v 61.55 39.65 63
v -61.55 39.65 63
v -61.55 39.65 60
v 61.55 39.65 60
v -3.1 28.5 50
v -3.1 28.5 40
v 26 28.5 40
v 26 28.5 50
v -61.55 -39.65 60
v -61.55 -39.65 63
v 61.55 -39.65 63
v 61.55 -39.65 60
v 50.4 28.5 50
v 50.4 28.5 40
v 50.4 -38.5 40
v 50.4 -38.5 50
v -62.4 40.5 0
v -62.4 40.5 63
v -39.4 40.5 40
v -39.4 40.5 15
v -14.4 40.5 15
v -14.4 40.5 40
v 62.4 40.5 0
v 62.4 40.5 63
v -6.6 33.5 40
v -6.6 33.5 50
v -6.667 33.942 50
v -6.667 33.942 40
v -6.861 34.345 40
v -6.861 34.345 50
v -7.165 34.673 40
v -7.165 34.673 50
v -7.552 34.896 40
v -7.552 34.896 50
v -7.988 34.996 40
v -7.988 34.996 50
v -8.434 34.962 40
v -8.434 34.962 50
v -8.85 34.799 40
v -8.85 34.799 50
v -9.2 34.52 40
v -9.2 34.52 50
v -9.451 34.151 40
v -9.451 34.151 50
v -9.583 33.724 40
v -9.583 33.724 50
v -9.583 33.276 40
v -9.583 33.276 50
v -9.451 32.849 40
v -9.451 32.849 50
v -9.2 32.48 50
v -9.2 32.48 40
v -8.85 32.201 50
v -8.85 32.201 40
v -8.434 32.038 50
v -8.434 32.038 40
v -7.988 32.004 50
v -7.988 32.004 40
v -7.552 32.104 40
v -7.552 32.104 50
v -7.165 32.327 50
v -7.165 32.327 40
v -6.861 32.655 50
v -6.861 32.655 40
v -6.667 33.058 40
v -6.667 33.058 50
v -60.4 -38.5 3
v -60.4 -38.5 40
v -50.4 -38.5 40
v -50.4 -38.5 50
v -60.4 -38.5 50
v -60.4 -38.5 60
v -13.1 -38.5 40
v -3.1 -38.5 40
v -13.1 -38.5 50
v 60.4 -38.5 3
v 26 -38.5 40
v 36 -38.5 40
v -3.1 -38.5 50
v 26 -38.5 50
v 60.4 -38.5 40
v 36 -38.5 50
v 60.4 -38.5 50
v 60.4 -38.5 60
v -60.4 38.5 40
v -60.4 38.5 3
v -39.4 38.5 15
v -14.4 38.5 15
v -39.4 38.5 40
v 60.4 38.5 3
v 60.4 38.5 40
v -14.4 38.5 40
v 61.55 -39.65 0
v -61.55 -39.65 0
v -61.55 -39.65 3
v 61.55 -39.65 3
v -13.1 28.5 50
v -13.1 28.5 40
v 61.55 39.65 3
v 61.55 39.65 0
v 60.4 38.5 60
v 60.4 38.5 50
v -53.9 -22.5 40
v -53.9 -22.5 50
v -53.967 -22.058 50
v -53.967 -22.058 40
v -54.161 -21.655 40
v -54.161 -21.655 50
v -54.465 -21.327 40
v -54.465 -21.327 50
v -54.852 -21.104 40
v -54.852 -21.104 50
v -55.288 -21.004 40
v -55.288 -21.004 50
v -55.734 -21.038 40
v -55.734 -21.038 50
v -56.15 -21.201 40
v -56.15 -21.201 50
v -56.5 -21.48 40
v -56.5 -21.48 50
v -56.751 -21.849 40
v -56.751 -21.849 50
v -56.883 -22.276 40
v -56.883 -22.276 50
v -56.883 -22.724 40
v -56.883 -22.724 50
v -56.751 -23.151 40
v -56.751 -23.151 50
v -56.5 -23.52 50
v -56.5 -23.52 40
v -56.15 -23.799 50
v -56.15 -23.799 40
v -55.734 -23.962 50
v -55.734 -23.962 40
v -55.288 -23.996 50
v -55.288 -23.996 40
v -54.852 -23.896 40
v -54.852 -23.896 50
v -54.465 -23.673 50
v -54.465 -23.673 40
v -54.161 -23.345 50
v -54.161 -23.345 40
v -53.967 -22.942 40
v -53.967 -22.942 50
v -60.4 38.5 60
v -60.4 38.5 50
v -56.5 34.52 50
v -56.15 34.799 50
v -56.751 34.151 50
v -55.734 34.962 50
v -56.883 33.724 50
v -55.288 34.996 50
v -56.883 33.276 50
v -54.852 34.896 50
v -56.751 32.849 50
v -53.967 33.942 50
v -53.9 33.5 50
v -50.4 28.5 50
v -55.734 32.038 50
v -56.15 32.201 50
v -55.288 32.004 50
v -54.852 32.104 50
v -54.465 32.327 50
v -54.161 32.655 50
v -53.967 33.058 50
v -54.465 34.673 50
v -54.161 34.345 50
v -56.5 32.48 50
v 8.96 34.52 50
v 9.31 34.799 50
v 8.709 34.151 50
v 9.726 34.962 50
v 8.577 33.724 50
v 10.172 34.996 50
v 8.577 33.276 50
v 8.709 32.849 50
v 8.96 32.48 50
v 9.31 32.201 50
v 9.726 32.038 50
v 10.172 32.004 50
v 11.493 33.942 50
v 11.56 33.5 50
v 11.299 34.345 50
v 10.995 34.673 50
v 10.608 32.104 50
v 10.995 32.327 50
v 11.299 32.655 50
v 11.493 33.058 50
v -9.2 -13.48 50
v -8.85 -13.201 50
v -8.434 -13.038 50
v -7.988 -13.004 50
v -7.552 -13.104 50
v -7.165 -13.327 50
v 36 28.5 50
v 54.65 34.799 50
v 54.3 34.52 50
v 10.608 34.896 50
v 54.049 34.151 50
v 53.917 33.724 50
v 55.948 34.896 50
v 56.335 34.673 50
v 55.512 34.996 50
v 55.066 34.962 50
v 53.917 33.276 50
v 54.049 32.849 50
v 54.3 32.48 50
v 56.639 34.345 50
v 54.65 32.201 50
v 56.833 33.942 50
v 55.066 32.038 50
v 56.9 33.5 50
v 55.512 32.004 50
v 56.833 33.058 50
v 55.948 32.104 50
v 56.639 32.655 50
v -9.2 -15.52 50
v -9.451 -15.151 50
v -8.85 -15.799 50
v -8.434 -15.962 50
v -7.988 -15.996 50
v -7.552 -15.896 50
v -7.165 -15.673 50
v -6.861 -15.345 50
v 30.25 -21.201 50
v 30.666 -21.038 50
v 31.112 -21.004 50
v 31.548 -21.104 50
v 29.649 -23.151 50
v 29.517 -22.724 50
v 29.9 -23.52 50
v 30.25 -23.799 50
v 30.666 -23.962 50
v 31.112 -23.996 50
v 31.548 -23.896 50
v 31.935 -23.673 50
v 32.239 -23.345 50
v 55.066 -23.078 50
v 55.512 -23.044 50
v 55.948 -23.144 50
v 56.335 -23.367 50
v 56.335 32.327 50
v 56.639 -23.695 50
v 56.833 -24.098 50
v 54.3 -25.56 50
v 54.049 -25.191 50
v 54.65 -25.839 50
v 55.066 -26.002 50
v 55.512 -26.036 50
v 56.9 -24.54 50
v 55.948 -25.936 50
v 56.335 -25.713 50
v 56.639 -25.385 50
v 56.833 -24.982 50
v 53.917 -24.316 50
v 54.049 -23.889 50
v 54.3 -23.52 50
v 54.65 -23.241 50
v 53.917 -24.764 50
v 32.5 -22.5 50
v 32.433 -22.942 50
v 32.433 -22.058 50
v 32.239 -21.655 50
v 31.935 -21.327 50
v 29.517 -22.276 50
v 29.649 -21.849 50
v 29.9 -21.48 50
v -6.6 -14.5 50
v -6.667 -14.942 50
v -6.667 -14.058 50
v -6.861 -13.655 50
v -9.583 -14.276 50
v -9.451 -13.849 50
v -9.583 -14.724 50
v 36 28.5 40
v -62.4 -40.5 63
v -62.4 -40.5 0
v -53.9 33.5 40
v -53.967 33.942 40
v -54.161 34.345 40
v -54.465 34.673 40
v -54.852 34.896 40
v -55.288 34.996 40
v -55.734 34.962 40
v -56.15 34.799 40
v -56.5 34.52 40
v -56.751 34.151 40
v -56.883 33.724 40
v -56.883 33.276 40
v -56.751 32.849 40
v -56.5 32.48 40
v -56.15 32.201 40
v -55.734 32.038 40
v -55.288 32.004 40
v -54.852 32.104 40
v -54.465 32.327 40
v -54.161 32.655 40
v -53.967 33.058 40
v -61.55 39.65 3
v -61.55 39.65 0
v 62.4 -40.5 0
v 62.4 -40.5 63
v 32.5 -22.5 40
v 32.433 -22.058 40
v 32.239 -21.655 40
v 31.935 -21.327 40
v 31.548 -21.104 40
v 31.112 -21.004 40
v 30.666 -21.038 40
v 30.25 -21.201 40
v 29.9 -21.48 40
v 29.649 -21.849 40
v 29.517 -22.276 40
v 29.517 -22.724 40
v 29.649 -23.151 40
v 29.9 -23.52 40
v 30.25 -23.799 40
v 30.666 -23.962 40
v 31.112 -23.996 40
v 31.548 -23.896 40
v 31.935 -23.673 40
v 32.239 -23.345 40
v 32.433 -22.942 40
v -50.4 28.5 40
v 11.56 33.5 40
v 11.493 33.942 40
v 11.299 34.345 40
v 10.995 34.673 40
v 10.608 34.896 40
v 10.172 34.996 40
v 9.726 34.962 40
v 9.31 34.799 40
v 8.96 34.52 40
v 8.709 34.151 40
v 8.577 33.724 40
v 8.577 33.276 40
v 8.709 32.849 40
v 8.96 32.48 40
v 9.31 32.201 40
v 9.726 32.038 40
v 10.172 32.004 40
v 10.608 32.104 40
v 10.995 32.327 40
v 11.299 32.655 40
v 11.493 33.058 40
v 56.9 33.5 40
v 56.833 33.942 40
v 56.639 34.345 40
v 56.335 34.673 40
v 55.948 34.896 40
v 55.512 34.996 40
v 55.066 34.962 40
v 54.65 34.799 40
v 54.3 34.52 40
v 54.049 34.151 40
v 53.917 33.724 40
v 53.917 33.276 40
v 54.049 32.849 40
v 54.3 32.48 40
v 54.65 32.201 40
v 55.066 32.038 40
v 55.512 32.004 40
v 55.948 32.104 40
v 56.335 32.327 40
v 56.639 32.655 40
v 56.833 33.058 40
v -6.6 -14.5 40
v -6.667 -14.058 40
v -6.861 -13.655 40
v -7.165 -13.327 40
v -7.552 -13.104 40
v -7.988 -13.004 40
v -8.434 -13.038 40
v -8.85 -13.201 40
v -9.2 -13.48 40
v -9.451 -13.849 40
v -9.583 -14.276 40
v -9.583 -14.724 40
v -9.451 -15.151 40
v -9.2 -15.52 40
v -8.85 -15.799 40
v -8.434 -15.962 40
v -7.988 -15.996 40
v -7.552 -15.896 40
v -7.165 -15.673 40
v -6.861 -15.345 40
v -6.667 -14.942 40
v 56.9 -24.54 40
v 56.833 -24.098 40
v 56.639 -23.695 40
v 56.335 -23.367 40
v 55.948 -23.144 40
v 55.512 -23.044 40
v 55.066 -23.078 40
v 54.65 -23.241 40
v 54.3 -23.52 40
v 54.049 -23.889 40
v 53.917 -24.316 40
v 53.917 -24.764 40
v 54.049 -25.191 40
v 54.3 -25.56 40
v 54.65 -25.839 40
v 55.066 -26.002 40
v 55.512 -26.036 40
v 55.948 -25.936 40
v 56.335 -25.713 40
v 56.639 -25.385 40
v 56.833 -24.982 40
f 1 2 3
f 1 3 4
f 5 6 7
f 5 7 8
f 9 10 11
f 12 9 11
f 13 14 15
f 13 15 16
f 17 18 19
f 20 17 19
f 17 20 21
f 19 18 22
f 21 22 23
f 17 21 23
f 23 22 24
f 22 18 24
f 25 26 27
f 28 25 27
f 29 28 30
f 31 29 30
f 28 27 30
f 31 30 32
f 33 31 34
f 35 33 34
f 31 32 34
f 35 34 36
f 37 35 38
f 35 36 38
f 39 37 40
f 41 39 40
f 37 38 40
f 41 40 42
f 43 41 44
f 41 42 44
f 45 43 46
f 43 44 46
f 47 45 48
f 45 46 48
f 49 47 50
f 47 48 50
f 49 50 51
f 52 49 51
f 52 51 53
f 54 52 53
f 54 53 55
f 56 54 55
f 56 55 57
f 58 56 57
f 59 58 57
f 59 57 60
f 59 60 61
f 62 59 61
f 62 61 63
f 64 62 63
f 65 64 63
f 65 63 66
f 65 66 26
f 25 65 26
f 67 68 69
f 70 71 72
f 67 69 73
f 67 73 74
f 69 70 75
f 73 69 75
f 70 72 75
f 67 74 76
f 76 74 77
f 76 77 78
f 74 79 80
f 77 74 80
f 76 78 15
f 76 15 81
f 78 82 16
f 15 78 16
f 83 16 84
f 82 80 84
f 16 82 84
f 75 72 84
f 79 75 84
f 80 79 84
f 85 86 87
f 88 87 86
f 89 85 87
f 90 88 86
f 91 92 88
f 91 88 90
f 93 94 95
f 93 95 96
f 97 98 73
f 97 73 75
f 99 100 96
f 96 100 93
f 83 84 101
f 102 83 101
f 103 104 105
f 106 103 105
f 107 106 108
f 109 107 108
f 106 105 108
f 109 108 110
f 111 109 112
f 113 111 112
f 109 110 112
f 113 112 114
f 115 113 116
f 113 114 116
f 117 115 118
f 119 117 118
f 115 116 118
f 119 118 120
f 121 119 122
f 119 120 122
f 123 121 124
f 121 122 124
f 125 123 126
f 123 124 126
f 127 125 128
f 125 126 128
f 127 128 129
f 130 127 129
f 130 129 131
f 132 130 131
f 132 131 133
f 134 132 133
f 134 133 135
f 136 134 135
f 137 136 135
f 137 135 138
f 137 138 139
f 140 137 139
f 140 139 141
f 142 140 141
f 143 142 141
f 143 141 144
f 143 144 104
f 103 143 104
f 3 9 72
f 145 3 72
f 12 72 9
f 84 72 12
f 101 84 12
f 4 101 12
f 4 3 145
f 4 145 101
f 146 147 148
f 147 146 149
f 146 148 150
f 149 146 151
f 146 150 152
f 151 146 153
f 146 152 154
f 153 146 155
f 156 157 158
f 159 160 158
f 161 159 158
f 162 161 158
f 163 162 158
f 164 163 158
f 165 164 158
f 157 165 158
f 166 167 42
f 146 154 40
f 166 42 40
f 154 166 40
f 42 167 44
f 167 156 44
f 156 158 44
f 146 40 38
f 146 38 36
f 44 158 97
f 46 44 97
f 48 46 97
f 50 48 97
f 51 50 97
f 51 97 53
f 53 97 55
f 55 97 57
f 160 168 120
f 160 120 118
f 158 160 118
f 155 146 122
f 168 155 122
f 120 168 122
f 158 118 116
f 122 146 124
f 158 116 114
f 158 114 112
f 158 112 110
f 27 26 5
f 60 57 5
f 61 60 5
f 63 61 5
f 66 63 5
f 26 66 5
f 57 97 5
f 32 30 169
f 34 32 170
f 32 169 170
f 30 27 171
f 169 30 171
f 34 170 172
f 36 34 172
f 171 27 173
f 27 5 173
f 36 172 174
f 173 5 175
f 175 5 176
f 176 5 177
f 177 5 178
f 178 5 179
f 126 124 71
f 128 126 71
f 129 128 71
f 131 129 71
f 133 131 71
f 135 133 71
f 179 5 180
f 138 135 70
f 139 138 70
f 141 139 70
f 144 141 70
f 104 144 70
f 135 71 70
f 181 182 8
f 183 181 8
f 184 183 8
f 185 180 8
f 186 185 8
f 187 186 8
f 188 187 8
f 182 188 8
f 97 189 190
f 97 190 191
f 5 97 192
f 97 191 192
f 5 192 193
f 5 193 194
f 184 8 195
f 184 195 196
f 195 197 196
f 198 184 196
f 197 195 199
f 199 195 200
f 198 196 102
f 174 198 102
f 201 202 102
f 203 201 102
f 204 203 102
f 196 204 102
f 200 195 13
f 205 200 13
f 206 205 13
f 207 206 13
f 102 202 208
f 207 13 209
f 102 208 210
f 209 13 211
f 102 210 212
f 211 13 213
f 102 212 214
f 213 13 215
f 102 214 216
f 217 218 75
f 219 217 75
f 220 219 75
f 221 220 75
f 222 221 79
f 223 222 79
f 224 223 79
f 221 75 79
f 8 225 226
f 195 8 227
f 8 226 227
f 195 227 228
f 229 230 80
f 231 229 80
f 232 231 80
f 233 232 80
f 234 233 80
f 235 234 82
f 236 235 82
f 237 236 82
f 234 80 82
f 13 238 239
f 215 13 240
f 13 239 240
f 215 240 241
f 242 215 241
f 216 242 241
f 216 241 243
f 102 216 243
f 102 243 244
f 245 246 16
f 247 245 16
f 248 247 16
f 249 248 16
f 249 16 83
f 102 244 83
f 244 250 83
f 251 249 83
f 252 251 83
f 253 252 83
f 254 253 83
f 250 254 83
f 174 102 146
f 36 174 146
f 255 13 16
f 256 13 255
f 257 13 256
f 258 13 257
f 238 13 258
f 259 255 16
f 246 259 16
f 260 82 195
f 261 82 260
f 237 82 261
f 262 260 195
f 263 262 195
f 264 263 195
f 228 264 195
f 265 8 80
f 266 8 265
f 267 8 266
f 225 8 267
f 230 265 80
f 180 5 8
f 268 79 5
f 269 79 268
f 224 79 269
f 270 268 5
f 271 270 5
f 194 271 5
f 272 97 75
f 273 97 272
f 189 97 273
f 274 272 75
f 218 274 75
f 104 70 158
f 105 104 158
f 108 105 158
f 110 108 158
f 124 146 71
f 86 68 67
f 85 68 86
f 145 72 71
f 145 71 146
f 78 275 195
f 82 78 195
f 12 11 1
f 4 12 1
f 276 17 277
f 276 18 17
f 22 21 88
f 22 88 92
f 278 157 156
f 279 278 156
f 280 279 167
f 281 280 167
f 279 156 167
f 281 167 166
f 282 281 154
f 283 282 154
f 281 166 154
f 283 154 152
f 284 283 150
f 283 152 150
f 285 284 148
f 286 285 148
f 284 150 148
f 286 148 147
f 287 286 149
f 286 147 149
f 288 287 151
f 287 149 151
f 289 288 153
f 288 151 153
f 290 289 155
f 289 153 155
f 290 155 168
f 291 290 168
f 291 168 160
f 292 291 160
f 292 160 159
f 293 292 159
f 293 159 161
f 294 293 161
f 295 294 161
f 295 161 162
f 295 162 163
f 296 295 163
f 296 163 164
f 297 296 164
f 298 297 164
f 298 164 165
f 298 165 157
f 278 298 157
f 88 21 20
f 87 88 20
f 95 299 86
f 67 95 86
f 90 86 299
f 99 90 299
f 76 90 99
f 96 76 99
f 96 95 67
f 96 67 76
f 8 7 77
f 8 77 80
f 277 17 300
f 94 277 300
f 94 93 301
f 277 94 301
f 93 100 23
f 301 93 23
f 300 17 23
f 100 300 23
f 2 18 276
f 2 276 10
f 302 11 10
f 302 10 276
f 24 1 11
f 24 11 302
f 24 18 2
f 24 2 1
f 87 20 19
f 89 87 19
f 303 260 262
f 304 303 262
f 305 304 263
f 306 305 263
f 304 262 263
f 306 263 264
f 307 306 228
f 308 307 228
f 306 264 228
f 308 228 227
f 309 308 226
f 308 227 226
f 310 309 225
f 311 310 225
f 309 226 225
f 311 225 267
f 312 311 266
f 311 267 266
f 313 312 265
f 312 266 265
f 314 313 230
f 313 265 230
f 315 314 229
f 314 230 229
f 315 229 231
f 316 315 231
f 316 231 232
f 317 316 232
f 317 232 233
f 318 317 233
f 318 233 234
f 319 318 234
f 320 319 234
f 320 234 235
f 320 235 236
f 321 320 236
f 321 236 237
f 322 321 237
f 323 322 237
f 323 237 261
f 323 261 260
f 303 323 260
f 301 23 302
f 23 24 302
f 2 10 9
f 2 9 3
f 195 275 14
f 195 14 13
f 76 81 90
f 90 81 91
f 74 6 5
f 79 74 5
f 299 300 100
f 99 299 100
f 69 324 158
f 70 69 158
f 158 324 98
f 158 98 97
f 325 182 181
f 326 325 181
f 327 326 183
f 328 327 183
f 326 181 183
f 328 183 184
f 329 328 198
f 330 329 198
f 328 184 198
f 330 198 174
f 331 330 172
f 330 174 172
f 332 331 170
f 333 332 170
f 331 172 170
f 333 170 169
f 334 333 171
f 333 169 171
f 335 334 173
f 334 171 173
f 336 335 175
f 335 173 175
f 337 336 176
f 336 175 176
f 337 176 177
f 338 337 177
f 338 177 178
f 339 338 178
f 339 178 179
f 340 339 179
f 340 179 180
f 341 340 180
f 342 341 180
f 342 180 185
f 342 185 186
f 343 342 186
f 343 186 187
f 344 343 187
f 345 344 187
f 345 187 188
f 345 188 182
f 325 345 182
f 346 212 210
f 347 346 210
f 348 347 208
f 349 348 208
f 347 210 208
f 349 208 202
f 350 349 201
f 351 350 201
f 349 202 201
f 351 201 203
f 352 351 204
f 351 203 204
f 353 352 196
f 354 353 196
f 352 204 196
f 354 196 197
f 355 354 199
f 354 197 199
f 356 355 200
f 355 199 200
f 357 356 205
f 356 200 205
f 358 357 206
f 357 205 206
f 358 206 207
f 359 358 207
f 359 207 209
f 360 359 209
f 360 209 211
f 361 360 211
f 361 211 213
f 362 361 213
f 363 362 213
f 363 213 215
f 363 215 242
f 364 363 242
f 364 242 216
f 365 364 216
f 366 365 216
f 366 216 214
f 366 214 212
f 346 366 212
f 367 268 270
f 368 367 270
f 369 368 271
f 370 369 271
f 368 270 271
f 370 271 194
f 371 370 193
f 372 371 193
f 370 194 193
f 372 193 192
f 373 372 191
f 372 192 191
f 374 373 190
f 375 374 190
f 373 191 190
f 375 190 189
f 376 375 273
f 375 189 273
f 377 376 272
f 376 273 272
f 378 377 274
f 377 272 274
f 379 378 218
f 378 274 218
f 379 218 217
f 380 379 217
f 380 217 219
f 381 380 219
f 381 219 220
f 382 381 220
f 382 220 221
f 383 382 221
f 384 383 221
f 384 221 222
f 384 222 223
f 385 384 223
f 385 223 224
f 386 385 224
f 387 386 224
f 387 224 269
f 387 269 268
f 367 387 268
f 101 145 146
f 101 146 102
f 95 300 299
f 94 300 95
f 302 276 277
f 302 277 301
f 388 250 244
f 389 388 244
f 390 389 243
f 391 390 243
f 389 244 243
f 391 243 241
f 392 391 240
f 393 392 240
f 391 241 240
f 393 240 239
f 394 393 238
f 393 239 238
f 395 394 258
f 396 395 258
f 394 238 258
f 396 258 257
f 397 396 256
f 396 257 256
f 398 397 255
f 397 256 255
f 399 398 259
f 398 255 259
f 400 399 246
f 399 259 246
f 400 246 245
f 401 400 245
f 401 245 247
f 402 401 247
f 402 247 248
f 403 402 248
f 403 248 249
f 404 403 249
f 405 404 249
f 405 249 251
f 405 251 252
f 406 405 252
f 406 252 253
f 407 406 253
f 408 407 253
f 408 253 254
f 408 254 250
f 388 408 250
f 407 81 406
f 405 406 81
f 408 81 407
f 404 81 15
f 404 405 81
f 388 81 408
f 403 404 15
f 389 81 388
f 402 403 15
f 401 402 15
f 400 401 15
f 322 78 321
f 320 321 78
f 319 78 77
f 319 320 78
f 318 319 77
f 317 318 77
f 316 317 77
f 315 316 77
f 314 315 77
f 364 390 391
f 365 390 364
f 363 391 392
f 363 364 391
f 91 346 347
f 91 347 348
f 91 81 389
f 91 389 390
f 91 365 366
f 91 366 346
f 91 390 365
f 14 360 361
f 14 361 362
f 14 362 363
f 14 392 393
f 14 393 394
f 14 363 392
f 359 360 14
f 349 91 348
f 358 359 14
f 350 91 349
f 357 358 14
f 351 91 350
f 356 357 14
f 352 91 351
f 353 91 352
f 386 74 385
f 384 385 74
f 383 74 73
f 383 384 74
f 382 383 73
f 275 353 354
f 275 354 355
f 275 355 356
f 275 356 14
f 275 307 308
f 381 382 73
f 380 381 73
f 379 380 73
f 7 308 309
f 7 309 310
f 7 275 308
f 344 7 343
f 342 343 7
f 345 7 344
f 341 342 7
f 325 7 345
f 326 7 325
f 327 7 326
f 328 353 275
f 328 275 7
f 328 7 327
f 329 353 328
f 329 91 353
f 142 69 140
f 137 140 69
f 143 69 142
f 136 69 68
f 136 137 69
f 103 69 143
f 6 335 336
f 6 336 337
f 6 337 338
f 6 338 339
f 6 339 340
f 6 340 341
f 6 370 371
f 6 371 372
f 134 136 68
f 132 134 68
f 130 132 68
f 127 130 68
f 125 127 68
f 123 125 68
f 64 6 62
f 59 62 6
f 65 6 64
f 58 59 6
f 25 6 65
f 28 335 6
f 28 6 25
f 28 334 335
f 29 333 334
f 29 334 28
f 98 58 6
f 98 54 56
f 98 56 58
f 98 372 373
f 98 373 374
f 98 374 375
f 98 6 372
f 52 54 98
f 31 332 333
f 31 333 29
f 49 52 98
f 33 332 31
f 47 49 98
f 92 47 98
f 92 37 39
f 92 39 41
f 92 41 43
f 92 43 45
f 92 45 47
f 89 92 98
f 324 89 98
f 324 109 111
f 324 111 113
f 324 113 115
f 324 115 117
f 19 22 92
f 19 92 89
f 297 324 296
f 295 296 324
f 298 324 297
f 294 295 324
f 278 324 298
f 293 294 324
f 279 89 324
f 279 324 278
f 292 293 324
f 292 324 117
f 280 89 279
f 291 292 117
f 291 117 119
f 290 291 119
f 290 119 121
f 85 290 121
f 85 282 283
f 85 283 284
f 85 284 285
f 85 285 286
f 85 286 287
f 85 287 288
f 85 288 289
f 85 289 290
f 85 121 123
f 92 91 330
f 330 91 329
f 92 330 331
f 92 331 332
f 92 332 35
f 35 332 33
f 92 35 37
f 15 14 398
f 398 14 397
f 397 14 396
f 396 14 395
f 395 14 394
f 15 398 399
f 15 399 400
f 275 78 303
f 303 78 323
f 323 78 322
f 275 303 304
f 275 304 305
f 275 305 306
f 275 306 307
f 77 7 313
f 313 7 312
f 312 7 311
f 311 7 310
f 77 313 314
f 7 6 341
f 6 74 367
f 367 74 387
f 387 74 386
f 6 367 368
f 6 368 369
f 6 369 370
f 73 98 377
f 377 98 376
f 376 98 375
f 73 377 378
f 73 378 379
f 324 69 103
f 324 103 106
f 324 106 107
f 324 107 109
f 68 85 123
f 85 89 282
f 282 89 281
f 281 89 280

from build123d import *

# Parameters (mm, degrees)
F0_W      = 124.8
F0_H      = 81
F1_DEPTH  = 63
F2_W      = 123.1
F2_H      = 79.3
F3_DEPTH  = 3
F4_W      = 123.1
F4_H      = 79.3
F5_DEPTH  = 3
F6_W      = 120.8
F6_H      = 77
F7_DEPTH  = 60.001
F8_W      = 12
F8_H      = 10
F9_DEPTH  = 81
F10_W     = 12
F10_H     = 10
F11_DEPTH = 81
F12_W     = 12
F12_H     = 10
F13_DEPTH = 124.8
F14_R     = 1.5
F15_DEPTH = 50.001
F16_R     = 1.5
F17_DEPTH = 50.001
F18_R     = 1.5
F19_DEPTH = 50.001
F20_R     = 1.5
F21_DEPTH = 50.001
F22_R     = 1.5
F23_DEPTH = 50.001
F24_W     = 10
F24_H     = 10
F25_DEPTH = 81
F26_R     = 1.5
F27_DEPTH = 50.001
F28_W     = 10
F28_H     = 10
F29_DEPTH = 69
F30_R     = 1.5
F31_DEPTH = 50.001
F32_W     = 25
F32_H     = 25
F33_DEPTH = 25
F34_R     = 1.5
F35_DEPTH = 50.001


with BuildPart() as f1:
    # F0 (on Top) → F1 (new body)
    with BuildSketch(Plane.XY):
        Rectangle(F0_W, F0_H)
    extrude(amount=F1_DEPTH)

    # F2 (on face) → F3 (cut)
    with BuildSketch(Plane.XY.offset(63)):
        Rectangle(F2_W, F2_H)
    extrude(amount=-F3_DEPTH, mode=Mode.SUBTRACT)

    # F4 (on face) → F5 (cut)
    with BuildSketch(Plane(origin=(0, 0, 0), x_dir=(1, 0, 0), z_dir=(0, 0, -1))):
        Rectangle(F4_W, F4_H)
    extrude(amount=-F5_DEPTH, mode=Mode.SUBTRACT)

    # F6 (on face) → F7 (cut, through all)
    with BuildSketch(Plane.XY.offset(60)):
        Rectangle(F6_W, F6_H)
    extrude(amount=-F7_DEPTH, mode=Mode.SUBTRACT)

    # F8 (on face) → F9 (join)
    with BuildSketch(Plane.XZ.offset(40.5)):
        with Locations((-56.4, 45)):
            Rectangle(F8_W, F8_H)
    extrude(amount=-F9_DEPTH)

    # F10 (on face) → F11 (join)
    with BuildSketch(Plane.XZ.offset(40.5)):
        with Locations((56.4, 45)):
            Rectangle(F10_W, F10_H)
    extrude(amount=-F11_DEPTH)

    # F12 (on face) → F13 (join)
    with BuildSketch(Plane(origin=(-62.4, 0, 0), x_dir=(0, -1, 0), z_dir=(-1, 0, 0))):
        with Locations((-34.5, 45)):
            Rectangle(F12_W, F12_H)
    extrude(amount=-F13_DEPTH)

    # F14 (on face) → F15 (cut, through all)
    with BuildSketch(Plane.XY.offset(50)):
        with Locations((-55.4, 33.5)):
            Circle(F14_R)
    extrude(amount=-F15_DEPTH, mode=Mode.SUBTRACT)

    # F16 (on face) → F17 (cut, through all)
    with BuildSketch(Plane.XY.offset(50)):
        with Locations((55.4, 33.5)):
            Circle(F16_R)
    extrude(amount=-F17_DEPTH, mode=Mode.SUBTRACT)

    # F18 (on face) → F19 (cut, through all)
    with BuildSketch(Plane.XY.offset(50)):
        with Locations((-55.4, -22.5)):
            Circle(F18_R)
    extrude(amount=-F19_DEPTH, mode=Mode.SUBTRACT)

    # F20 (on face) → F21 (cut, through all)
    with BuildSketch(Plane.XY.offset(50)):
        with Locations((-8.1, 33.5)):
            Circle(F20_R)
    extrude(amount=-F21_DEPTH, mode=Mode.SUBTRACT)

    # F22 (on face) → F23 (cut, through all)
    with BuildSketch(Plane.XY.offset(50)):
        with Locations((10.06, 33.5)):
            Circle(F22_R)
    extrude(amount=-F23_DEPTH, mode=Mode.SUBTRACT)

    # F24 (on face) → F25 (join)
    with BuildSketch(Plane.XZ.offset(40.5)):
        with Locations((31, 45)):
            Rectangle(F24_W, F24_H)
    extrude(amount=-F25_DEPTH)

    # F26 (on face) → F27 (cut, through all)
    with BuildSketch(Plane.XY.offset(50)):
        with Locations((31, -22.5)):
            Circle(F26_R)
    extrude(amount=-F27_DEPTH, mode=Mode.SUBTRACT)

    # F28 (on face) → F29 (join)
    with BuildSketch(Plane.XZ.offset(40.5)):
        with Locations((-8.1, 45)):
            Rectangle(F28_W, F28_H)
    extrude(amount=-F29_DEPTH)

    # F30 (on face) → F31 (cut, through all)
    with BuildSketch(Plane.XY.offset(50)):
        with Locations((-8.1, -14.5)):
            Circle(F30_R)
    extrude(amount=-F31_DEPTH, mode=Mode.SUBTRACT)

    # F32 (on face) → F33 (cut)
    with BuildSketch(Plane(origin=(0, 40.5, 0), x_dir=(-1, 0, 0), z_dir=(0, 1, 0))):
        with Locations((26.9, 27.5)):
            Rectangle(F32_W, F32_H)
    extrude(amount=-F33_DEPTH, mode=Mode.SUBTRACT)

    # F34 (on face) → F35 (cut, through all)
    with BuildSketch(Plane.XY.offset(50)):
        with Locations((55.4, -24.54)):
            Circle(F34_R)
    extrude(amount=-F35_DEPTH, mode=Mode.SUBTRACT)


solid = f1.part
